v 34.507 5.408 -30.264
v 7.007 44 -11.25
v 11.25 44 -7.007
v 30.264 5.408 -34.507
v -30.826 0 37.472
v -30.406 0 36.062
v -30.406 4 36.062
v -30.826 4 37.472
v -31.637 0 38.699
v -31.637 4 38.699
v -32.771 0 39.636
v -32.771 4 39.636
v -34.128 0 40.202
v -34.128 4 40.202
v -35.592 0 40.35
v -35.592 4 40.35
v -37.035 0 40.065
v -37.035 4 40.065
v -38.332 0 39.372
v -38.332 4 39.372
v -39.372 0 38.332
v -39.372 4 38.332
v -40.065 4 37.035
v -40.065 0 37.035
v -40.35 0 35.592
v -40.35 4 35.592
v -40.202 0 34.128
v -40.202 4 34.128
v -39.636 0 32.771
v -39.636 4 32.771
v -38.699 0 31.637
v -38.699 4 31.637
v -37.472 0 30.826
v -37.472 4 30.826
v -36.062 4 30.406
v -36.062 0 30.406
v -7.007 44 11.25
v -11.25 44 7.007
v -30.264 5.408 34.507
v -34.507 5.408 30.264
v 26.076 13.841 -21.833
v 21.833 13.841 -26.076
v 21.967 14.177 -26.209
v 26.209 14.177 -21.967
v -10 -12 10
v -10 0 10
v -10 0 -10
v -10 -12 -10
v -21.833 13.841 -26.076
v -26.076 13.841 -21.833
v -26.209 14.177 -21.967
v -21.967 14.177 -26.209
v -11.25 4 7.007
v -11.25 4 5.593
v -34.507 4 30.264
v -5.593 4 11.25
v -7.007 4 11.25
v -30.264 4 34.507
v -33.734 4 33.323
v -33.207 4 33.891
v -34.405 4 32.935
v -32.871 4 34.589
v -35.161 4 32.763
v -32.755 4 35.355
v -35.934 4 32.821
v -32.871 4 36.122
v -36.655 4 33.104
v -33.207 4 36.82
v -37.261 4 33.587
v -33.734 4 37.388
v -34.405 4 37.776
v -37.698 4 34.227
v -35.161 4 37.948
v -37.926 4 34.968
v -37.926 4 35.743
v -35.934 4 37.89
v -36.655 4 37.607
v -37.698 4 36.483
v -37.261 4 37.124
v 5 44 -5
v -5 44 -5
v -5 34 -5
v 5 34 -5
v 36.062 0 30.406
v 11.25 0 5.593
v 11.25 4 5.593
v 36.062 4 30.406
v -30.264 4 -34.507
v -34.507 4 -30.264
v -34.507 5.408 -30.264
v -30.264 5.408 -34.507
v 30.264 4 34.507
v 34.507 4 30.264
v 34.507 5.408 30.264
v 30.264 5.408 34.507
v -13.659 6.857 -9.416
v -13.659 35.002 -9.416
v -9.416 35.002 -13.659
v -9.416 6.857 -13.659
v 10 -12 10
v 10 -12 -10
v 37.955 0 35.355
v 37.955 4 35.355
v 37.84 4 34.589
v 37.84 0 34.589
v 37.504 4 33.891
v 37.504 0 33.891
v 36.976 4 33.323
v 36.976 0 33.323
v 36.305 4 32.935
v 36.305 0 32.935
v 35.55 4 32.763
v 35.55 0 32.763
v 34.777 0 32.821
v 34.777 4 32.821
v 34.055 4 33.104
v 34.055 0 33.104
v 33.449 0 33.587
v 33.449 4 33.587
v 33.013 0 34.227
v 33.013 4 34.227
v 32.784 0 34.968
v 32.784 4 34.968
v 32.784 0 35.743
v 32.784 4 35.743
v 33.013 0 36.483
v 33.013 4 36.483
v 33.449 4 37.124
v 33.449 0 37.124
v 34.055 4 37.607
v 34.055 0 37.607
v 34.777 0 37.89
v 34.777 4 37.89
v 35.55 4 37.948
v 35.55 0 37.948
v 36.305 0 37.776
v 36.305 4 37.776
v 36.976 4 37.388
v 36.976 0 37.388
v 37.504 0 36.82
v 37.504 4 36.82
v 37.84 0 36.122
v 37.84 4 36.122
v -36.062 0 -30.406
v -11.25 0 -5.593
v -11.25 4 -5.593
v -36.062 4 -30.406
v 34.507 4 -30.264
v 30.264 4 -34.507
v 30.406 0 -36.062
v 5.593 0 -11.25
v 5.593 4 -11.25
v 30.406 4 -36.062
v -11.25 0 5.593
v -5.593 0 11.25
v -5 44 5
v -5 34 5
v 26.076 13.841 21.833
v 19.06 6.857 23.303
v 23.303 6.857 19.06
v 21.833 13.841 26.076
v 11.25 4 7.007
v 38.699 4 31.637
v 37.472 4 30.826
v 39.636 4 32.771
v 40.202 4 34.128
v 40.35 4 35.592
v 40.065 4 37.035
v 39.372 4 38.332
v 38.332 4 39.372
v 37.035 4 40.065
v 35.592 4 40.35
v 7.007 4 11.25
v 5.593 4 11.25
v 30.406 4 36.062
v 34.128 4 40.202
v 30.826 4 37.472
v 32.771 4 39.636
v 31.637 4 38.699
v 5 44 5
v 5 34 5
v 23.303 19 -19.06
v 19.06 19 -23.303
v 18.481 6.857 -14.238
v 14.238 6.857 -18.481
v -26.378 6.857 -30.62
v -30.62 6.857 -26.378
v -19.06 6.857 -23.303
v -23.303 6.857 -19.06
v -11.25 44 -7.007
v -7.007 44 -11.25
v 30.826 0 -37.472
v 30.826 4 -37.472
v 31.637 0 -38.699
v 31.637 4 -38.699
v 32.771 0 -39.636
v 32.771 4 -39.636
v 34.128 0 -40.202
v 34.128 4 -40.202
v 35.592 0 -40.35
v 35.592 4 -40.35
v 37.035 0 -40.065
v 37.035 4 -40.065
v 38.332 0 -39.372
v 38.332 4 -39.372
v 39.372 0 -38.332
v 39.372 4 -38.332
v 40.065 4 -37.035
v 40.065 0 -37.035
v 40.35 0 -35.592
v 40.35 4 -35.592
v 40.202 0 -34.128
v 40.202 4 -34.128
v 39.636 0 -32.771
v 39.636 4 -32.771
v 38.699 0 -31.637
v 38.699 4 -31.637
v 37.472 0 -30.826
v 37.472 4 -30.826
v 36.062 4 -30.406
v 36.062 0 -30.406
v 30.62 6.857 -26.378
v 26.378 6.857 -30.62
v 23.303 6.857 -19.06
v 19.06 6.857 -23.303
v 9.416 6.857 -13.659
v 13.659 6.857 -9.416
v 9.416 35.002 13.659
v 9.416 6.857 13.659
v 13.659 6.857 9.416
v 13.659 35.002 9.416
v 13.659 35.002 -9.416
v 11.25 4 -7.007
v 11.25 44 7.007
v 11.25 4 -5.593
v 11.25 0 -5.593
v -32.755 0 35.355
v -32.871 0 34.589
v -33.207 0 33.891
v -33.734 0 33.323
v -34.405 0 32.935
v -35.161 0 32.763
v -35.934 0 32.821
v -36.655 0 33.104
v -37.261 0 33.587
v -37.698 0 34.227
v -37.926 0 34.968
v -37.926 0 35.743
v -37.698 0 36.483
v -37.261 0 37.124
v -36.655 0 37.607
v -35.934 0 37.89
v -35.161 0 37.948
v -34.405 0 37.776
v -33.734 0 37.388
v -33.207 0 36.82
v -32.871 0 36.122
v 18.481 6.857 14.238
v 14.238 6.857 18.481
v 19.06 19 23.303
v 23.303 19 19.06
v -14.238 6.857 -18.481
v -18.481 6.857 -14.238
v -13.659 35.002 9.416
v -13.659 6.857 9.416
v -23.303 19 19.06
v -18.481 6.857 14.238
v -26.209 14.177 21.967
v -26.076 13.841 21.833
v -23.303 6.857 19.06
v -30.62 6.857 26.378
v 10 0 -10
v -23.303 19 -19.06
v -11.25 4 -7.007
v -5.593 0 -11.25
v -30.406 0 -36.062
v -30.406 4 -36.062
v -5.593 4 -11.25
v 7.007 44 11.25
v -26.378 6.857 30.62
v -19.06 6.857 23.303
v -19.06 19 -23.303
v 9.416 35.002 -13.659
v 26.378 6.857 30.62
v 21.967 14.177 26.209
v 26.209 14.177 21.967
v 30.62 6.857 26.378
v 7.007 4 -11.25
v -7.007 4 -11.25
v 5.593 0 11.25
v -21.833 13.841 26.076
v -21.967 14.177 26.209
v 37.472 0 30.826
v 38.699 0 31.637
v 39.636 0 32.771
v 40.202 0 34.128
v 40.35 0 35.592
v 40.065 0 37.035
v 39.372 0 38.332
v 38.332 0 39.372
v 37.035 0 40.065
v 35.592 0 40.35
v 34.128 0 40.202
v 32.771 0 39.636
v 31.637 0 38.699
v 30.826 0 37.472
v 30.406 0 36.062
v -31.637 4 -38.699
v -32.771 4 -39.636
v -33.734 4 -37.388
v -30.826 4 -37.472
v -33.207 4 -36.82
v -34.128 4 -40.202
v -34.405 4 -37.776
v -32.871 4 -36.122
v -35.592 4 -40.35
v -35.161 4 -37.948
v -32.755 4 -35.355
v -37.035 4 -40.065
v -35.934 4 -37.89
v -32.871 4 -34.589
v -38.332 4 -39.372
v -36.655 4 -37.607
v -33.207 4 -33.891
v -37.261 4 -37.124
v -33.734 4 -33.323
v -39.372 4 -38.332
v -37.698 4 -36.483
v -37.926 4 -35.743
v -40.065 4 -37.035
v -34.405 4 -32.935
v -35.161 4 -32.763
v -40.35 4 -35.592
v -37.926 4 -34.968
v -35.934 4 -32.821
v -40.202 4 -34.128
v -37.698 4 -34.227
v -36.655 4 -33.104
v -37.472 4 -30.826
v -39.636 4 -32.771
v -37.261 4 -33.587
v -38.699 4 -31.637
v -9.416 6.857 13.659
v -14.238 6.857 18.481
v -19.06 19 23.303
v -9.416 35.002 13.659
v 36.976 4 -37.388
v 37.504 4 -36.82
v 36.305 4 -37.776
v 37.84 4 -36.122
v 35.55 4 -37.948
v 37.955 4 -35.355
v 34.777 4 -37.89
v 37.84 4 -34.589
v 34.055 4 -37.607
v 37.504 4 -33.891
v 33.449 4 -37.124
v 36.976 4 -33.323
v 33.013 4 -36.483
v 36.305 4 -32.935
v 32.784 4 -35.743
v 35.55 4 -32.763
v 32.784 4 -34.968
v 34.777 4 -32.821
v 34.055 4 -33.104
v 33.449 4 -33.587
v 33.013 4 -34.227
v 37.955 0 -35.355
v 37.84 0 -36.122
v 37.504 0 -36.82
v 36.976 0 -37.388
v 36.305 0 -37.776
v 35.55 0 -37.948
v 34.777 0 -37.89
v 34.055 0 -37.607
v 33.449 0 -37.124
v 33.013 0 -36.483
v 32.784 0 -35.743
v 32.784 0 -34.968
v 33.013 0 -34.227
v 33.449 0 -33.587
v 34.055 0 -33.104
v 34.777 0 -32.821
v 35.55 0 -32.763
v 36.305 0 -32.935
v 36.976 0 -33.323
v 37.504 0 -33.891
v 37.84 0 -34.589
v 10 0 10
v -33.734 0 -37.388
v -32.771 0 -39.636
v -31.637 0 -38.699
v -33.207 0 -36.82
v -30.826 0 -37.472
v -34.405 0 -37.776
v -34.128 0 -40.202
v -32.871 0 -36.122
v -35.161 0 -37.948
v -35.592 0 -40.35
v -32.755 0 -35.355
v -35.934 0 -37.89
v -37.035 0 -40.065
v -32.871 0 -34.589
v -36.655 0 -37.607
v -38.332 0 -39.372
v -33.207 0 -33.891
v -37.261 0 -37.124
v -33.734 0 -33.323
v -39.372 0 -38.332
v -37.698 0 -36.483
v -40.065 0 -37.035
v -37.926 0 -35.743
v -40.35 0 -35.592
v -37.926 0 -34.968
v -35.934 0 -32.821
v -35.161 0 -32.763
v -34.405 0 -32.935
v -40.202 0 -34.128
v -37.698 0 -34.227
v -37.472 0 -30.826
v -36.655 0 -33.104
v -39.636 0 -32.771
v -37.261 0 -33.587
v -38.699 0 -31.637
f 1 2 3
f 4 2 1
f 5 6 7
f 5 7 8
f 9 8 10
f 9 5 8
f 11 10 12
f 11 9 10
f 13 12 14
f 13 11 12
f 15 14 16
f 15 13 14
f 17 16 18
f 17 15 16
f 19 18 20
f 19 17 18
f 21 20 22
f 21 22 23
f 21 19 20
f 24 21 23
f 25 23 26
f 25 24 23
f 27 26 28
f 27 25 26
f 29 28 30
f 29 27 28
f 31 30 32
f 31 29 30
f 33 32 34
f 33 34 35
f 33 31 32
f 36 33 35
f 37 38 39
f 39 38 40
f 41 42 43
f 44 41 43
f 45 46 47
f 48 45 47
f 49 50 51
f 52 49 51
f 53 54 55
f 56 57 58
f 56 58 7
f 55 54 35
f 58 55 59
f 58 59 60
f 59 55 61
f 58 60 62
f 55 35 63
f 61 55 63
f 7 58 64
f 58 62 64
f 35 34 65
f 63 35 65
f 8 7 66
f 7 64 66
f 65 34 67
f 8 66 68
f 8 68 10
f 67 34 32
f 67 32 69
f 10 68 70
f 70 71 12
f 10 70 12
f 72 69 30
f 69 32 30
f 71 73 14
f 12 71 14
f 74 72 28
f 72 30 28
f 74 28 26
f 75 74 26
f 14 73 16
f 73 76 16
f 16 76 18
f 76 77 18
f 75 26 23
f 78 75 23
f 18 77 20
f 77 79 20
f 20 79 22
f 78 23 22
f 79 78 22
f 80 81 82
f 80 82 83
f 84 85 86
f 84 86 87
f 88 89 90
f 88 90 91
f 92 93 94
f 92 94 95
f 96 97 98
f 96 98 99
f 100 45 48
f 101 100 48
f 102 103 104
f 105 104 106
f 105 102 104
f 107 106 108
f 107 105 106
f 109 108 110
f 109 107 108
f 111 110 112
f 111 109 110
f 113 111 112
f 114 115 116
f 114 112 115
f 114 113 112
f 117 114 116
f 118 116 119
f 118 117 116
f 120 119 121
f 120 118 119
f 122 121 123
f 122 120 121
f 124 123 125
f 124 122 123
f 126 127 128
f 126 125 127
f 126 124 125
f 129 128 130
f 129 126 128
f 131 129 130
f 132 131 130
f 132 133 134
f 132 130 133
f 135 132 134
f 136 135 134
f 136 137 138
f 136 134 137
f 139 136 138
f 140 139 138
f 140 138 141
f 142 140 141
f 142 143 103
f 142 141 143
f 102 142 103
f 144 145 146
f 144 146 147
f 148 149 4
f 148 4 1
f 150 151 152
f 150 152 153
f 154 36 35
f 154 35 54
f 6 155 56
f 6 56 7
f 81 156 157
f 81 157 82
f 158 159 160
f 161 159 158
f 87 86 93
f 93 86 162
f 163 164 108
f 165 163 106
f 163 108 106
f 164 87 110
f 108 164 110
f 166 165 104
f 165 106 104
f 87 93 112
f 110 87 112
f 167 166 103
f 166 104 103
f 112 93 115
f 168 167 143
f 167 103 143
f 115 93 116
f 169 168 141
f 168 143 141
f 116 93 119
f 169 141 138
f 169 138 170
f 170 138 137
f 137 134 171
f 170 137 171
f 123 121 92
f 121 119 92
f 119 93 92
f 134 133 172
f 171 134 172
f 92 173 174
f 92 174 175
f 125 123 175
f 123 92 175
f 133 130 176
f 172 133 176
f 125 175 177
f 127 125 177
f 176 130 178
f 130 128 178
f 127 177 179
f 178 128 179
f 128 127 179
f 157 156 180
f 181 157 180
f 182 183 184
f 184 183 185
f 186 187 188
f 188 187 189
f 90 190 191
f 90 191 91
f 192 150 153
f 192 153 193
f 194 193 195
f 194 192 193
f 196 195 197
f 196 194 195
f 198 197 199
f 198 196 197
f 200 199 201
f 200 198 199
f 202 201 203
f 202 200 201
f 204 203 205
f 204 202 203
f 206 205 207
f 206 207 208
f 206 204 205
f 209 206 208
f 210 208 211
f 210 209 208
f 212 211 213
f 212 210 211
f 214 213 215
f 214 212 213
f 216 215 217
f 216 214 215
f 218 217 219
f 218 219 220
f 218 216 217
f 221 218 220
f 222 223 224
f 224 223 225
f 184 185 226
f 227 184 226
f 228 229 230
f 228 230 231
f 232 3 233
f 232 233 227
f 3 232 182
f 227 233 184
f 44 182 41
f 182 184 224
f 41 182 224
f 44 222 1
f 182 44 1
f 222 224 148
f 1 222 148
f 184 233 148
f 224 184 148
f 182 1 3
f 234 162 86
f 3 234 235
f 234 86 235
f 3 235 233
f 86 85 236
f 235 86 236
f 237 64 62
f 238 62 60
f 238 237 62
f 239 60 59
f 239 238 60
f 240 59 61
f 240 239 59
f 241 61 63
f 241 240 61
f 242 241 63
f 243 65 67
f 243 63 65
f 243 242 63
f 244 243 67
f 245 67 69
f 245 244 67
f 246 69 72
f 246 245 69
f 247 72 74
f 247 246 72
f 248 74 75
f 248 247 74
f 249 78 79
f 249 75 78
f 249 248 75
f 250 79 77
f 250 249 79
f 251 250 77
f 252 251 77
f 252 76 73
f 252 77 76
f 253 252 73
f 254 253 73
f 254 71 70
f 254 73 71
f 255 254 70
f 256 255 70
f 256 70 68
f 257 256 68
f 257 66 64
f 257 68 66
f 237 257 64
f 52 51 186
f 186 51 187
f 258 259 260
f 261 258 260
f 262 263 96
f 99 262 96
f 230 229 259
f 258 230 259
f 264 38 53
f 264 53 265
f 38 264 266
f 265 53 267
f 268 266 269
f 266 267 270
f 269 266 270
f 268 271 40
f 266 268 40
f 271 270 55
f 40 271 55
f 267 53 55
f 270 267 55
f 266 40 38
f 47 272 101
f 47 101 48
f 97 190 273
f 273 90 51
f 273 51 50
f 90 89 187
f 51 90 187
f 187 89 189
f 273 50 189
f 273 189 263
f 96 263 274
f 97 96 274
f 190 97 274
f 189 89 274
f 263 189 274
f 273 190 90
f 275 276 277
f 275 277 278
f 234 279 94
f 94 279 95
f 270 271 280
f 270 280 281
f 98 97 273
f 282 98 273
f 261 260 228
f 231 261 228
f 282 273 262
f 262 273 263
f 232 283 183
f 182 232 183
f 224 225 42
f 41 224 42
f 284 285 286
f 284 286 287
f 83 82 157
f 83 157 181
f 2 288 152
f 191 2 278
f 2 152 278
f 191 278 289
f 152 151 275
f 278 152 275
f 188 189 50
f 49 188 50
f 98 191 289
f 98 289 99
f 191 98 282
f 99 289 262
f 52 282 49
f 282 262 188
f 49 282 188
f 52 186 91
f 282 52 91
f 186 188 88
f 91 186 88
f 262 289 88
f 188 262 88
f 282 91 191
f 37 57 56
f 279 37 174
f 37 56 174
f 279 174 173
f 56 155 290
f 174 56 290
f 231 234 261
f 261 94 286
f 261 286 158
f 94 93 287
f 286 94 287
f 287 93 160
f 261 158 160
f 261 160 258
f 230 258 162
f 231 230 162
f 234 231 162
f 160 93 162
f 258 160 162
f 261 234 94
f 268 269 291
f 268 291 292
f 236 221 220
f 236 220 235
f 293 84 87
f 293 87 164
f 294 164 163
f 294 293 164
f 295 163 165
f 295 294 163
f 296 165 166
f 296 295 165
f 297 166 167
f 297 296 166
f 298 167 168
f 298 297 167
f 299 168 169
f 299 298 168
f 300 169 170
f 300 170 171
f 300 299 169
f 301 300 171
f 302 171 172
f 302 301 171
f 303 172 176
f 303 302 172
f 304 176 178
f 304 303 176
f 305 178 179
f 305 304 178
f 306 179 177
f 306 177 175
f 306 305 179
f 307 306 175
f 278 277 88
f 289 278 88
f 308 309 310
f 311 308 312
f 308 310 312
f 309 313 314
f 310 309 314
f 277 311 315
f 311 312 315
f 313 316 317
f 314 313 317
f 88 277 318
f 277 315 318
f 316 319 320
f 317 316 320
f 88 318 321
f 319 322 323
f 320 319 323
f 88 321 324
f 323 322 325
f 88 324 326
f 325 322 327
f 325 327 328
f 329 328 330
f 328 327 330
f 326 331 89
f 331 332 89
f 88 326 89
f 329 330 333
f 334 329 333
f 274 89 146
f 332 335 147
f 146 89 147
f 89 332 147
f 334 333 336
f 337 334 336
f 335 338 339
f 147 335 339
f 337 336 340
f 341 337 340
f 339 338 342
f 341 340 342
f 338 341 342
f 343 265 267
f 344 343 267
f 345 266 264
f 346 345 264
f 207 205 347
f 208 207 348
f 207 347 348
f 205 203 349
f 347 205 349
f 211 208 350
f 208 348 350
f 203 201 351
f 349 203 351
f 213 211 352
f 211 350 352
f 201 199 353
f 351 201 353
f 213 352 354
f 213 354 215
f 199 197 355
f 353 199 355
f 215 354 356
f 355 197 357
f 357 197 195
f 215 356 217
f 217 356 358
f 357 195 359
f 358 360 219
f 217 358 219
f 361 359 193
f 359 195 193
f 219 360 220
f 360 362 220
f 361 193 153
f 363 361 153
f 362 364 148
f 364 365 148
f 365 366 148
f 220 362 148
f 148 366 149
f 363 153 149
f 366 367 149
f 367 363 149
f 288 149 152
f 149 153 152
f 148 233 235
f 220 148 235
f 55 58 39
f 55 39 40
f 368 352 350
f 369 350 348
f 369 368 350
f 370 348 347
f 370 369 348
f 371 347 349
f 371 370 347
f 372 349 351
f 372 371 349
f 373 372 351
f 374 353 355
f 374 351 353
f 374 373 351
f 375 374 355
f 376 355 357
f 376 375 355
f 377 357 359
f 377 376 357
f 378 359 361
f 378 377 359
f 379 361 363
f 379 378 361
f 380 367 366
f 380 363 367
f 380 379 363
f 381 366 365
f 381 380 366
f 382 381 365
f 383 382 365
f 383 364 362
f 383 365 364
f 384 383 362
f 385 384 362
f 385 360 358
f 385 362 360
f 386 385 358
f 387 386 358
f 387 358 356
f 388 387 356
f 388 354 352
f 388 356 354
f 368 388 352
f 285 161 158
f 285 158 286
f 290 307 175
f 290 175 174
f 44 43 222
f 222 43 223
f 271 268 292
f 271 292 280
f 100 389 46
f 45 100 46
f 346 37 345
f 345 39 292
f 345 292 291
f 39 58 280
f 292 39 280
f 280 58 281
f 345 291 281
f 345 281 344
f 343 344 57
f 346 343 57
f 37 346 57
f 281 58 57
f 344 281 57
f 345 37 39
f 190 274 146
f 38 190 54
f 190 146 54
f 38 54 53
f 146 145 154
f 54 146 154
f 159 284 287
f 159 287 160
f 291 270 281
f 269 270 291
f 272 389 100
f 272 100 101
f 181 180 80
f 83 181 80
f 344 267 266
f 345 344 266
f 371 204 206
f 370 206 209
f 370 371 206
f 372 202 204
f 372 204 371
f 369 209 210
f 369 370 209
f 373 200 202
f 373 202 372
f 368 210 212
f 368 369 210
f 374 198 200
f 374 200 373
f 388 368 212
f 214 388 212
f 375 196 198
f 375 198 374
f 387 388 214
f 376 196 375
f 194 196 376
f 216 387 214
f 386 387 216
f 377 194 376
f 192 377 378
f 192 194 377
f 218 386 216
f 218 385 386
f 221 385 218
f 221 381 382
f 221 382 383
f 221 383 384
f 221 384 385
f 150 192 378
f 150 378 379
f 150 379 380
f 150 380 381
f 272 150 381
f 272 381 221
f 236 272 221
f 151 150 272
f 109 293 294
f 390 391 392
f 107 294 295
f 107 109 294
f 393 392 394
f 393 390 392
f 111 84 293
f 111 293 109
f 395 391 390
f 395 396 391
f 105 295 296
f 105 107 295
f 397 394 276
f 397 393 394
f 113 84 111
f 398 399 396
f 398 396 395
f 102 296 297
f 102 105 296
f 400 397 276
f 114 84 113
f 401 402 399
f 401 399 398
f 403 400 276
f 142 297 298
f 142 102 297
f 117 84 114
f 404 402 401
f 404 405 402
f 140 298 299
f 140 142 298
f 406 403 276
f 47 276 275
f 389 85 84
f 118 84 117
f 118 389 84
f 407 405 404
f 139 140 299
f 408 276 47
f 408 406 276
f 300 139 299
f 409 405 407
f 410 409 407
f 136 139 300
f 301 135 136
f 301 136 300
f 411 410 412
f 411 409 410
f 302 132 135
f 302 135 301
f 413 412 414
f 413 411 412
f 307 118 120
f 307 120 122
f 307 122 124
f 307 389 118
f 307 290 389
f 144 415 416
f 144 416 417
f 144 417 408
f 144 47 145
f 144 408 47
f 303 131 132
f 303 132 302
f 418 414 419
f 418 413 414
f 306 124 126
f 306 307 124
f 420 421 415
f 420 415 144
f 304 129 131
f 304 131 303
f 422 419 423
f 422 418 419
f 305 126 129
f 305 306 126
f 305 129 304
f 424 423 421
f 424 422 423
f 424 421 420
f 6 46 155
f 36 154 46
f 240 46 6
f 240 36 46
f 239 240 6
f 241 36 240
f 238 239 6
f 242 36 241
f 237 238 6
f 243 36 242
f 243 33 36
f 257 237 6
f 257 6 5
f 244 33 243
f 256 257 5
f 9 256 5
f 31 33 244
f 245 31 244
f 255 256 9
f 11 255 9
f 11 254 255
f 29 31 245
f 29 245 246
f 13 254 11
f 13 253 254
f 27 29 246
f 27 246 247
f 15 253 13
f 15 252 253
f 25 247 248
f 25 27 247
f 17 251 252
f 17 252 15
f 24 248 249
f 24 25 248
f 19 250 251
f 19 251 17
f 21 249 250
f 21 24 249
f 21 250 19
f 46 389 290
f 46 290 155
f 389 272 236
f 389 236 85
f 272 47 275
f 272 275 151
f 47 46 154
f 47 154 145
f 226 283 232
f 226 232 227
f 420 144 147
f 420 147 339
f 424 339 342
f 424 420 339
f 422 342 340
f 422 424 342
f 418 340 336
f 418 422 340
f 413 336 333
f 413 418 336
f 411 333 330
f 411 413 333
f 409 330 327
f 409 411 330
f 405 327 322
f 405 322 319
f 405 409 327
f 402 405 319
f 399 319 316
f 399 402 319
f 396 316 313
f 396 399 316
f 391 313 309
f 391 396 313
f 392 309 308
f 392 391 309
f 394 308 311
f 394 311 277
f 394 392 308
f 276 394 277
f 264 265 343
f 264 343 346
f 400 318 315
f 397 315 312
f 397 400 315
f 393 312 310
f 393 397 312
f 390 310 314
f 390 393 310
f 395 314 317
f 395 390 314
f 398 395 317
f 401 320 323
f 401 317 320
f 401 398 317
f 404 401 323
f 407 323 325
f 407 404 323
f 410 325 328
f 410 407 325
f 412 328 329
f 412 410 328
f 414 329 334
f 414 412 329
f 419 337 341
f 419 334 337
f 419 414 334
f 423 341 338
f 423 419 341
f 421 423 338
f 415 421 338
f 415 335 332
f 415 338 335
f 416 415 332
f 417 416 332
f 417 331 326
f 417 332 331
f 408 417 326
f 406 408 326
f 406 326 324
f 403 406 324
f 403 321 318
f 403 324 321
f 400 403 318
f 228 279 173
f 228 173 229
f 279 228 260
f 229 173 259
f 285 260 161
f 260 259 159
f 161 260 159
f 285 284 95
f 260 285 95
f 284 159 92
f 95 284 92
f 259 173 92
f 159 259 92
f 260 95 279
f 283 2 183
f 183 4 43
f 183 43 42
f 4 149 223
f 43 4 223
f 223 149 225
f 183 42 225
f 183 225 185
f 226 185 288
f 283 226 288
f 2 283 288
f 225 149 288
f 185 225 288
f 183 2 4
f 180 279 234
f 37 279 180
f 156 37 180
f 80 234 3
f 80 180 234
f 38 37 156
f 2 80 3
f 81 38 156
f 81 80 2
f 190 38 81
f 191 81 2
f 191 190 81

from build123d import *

# Parameters (mm, degrees)
SKETCH1_W               = 20
SKETCH1_H               = 20
BOSS_EXTRUDE2_DEPTH     = 12
BOSS_EXTRUDE3_DEPTH     = 4
SKETCH3_R               = 2.6
CUT_EXTRUDE1_DEPTH      = 7
BOSS_EXTRUDE4_DEPTH     = 40
BODY_MOVE_COPY1_ANGLE   = 45
CUT_EXTRUDE2_DEPTH      = 40
CUT_EXTRUDE2_DEPTH_BACK = 40
CUT_EXTRUDE3_DEPTH      = 40
CUT_EXTRUDE3_DEPTH_BACK = 40
CUT_EXTRUDE4_DEPTH      = 40
CUT_EXTRUDE4_DEPTH_BACK = 40
CUT_EXTRUDE7_DEPTH      = 40
CUT_EXTRUDE7_DEPTH_BACK = 40
BODY_MOVE_COPY2_ANGLE   = 45
SKETCH11_W              = 10
SKETCH11_H              = 10
CUT_EXTRUDE8_DEPTH      = 10
CUT_EXTRUDE9_DEPTH      = 17


with BuildPart() as part:
    # Sketch1 → Boss-Extrude2 (new body)
    with BuildSketch(Plane(origin=(0, 0, 0), x_dir=(1, 0, 0), z_dir=(0, 1, 0))):
        Rectangle(SKETCH1_W, SKETCH1_H)
    extrude(amount=-BOSS_EXTRUDE2_DEPTH)

    # Sketch2 → Boss-Extrude3 (add)
    with BuildSketch(Plane(origin=(0, 0, 0), x_dir=(1, 0, 0), z_dir=(0, 1, 0))):
        with BuildLine():
            Line((11.25, -5.593145751), (36.062445841, -30.405591591))
            ThreePointArc((36.062445841, -30.405591591), (38.890872965, -38.890872965), (30.405591591, -36.062445841))
            Line((30.405591591, -36.062445841), (5.593145751, -11.25))
            Line((5.593145751, -11.25), (-5.593145751, -11.25))
            Line((-5.593145751, -11.25), (-30.405591591, -36.062445841))
            ThreePointArc((-30.405591591, -36.062445841), (-38.890872965, -38.890872965), (-36.062445841, -30.405591591))
            Line((-36.062445841, -30.405591591), (-11.25, -5.593145751))
            Line((-11.25, -5.593145751), (-11.25, 5.593145751))
            Line((-11.25, 5.593145751), (-36.062445841, 30.405591591))
            ThreePointArc((-36.062445841, 30.405591591), (-38.890872965, 38.890872965), (-30.405591591, 36.062445841))
            Line((-30.405591591, 36.062445841), (-5.593145751, 11.25))
            Line((-5.593145751, 11.25), (5.593145751, 11.25))
            Line((5.593145751, 11.25), (30.405591591, 36.062445841))
            ThreePointArc((30.405591591, 36.062445841), (38.890872965, 38.890872965), (36.062445841, 30.405591591))
            Line((36.062445841, 30.405591591), (11.25, 5.593145751))
            Line((11.25, 5.593145751), (11.25, -5.593145751))
        make_face()
    extrude(amount=BOSS_EXTRUDE3_DEPTH)

    # Sketch3 → Cut-Extrude1 (cut)
    with BuildSketch(Plane(origin=(0, 0, 0), x_dir=(1, 0, 0), z_dir=(0, 1, 0))):
        with Locations(Location((-35.355339059, -35.355339059, 0), (0, 0, 270))):
            Circle(SKETCH3_R)
        with Locations(Location((-35.355339059, 35.355339059, 0), (0, 0, 270))):
            Circle(SKETCH3_R)
        with Locations(Location((35.355339059, 35.355339059, 0), (0, 0, 270))):
            Circle(SKETCH3_R)
        with Locations(Location((35.355339059, -35.355339059, 0), (0, 0, 270))):
            Circle(SKETCH3_R)
    extrude(amount=CUT_EXTRUDE1_DEPTH, mode=Mode.SUBTRACT)

    # Sketch4 → Boss-Extrude4 (add)
    with BuildSketch(Plane(origin=(0, 4, 0), x_dir=(1, 0, 0), z_dir=(0, 1, 0))):
        Polygon((-35.355339059, -31.112698372), (-31.112698372, -35.355339059), (-7.007359313, -11.25), (7.007359313, -11.25), (31.112698372, -35.355339059), (35.355339059, -31.112698372), (11.25, -7.007359313), (11.25, 7.007359313), (35.355339059, 31.112698372), (31.112698372, 35.355339059), (7.007359313, 11.25), (-7.007359313, 11.25), (-31.112698372, 35.355339059), (-35.355339059, 31.112698372), (-11.25, 7.007359313), (-11.25, -7.007359313), align=None)
    extrude(amount=BOSS_EXTRUDE4_DEPTH)


with BuildPart() as part_1:
    # Body-Move/Copy1: moved
    add(part.part.rotate(Axis((0, 0, 0), (0, 1, 0)), BODY_MOVE_COPY1_ANGLE))

    # Sketch6 → Cut-Extrude2 (cut, two sides: drawn at the far end of the back side and taken through both)
    with BuildSketch(Plane(origin=(0, 0, 0), x_dir=(0, 0, -1), z_dir=(1, 0, 0)).offset(-CUT_EXTRUDE2_DEPTH_BACK)):
        Polygon((-12.909902577, 44), (-47, 4), (-47, 44), align=None)
        Polygon((47, 44), (12.909902577, 44), (47, 4), align=None)
    extrude(amount=CUT_EXTRUDE2_DEPTH + CUT_EXTRUDE2_DEPTH_BACK, mode=Mode.SUBTRACT)

    # Sketch7 → Cut-Extrude3 (cut, two sides: drawn at the far end of the back side and taken through both)
    with BuildSketch(Plane.XY.offset(-CUT_EXTRUDE3_DEPTH_BACK)):
        Polygon((-47, 44), (-12.909902577, 44), (-47, 4), align=None)
        Polygon((47, 4), (47, 44), (12.909902577, 44), align=None)
    extrude(amount=CUT_EXTRUDE3_DEPTH + CUT_EXTRUDE3_DEPTH_BACK, mode=Mode.SUBTRACT)

    # Sketch8 → Cut-Extrude4 (cut, two sides: drawn at the far end of the back side and taken through both)
    with BuildSketch(Plane.XY.offset(-CUT_EXTRUDE4_DEPTH_BACK)):
        Polygon((-23.135931904, 6.857449794), (-29.954951288, 19), (-16.316912521, 35.002346486), (-16.316912521, 9), (-16.316912521, 6.857449794), align=None)
        Polygon((-29.954951288, 6.857449794), (-33.876748144, 13.840948819), (-34.065426963, 14.176927043), (-40.303469276, 6.857449794), align=None)
        Polygon((16.316912521, 9), (16.316912521, 35.002346486), (29.954951288, 19), (23.135931904, 6.857449794), (16.316912521, 6.857449794), align=None)
        Polygon((29.954951288, 6.857449794), (33.876748144, 13.840948819), (34.065426963, 14.176927043), (40.303469276, 6.857449794), align=None)
    extrude(amount=CUT_EXTRUDE4_DEPTH + CUT_EXTRUDE4_DEPTH_BACK, mode=Mode.SUBTRACT)

    # Sketch9 → Cut-Extrude7 (cut, two sides: drawn at the far end of the back side and taken through both)
    with BuildSketch(Plane(origin=(0, 0, 0), x_dir=(0, 0, -1), z_dir=(1, 0, 0)).offset(-CUT_EXTRUDE7_DEPTH_BACK)):
        Polygon((-23.135931904, 6.857449794), (-29.954951288, 19), (-16.316912521, 35.002346486), (-16.316912521, 9), (-16.316912521, 6.857449794), align=None)
        Polygon((-29.954951288, 6.857449794), (-33.876748144, 13.840948819), (-34.065426963, 14.176927043), (-40.303469276, 6.857449794), align=None)
        Polygon((16.316912521, 9), (16.316912521, 35.002346486), (29.954951288, 19), (23.135931904, 6.857449794), (16.316912521, 6.857449794), align=None)
        Polygon((29.954951288, 6.857449794), (33.876748144, 13.840948819), (34.065426963, 14.176927043), (40.303469276, 6.857449794), align=None)
    extrude(amount=CUT_EXTRUDE7_DEPTH + CUT_EXTRUDE7_DEPTH_BACK, mode=Mode.SUBTRACT)


with BuildPart() as part_2:
    # Body-Move/Copy2: moved
    add(part_1.part.rotate(Axis((0, 0, 0), (0, 1, 0)), BODY_MOVE_COPY2_ANGLE))

    # Sketch11 → Cut-Extrude8 (cut)
    with BuildSketch(Plane(origin=(0, 44, 0), x_dir=(1, 0, 0), z_dir=(0, 1, 0))):
        Rectangle(SKETCH11_W, SKETCH11_H)
    extrude(amount=-CUT_EXTRUDE8_DEPTH, mode=Mode.SUBTRACT)

    # Sketch12 → Cut-Extrude9 (cut)
    with BuildSketch(Plane(origin=(0, 4, 0), x_dir=(1, 0, 0), z_dir=(0, 1, 0))):
        Polygon((-35.355339059, -31.112698372), (-31.112698372, -35.355339059), (-30.264170235, -34.506810922), (-34.506810922, -30.264170235), align=None)
        Polygon((-30.264170235, 34.506810922), (-31.112698372, 35.355339059), (-35.355339059, 31.112698372), (-34.506810922, 30.264170235), align=None)
        Polygon((34.506810922, 30.264170235), (35.355339059, 31.112698372), (31.112698372, 35.355339059), (30.264170235, 34.506810922), align=None)
        Polygon((30.264170235, -34.506810922), (31.112698372, -35.355339059), (35.355339059, -31.112698372), (34.506810922, -30.264170235), align=None)
    extrude(amount=CUT_EXTRUDE9_DEPTH, mode=Mode.SUBTRACT)


solid = part_2.part
